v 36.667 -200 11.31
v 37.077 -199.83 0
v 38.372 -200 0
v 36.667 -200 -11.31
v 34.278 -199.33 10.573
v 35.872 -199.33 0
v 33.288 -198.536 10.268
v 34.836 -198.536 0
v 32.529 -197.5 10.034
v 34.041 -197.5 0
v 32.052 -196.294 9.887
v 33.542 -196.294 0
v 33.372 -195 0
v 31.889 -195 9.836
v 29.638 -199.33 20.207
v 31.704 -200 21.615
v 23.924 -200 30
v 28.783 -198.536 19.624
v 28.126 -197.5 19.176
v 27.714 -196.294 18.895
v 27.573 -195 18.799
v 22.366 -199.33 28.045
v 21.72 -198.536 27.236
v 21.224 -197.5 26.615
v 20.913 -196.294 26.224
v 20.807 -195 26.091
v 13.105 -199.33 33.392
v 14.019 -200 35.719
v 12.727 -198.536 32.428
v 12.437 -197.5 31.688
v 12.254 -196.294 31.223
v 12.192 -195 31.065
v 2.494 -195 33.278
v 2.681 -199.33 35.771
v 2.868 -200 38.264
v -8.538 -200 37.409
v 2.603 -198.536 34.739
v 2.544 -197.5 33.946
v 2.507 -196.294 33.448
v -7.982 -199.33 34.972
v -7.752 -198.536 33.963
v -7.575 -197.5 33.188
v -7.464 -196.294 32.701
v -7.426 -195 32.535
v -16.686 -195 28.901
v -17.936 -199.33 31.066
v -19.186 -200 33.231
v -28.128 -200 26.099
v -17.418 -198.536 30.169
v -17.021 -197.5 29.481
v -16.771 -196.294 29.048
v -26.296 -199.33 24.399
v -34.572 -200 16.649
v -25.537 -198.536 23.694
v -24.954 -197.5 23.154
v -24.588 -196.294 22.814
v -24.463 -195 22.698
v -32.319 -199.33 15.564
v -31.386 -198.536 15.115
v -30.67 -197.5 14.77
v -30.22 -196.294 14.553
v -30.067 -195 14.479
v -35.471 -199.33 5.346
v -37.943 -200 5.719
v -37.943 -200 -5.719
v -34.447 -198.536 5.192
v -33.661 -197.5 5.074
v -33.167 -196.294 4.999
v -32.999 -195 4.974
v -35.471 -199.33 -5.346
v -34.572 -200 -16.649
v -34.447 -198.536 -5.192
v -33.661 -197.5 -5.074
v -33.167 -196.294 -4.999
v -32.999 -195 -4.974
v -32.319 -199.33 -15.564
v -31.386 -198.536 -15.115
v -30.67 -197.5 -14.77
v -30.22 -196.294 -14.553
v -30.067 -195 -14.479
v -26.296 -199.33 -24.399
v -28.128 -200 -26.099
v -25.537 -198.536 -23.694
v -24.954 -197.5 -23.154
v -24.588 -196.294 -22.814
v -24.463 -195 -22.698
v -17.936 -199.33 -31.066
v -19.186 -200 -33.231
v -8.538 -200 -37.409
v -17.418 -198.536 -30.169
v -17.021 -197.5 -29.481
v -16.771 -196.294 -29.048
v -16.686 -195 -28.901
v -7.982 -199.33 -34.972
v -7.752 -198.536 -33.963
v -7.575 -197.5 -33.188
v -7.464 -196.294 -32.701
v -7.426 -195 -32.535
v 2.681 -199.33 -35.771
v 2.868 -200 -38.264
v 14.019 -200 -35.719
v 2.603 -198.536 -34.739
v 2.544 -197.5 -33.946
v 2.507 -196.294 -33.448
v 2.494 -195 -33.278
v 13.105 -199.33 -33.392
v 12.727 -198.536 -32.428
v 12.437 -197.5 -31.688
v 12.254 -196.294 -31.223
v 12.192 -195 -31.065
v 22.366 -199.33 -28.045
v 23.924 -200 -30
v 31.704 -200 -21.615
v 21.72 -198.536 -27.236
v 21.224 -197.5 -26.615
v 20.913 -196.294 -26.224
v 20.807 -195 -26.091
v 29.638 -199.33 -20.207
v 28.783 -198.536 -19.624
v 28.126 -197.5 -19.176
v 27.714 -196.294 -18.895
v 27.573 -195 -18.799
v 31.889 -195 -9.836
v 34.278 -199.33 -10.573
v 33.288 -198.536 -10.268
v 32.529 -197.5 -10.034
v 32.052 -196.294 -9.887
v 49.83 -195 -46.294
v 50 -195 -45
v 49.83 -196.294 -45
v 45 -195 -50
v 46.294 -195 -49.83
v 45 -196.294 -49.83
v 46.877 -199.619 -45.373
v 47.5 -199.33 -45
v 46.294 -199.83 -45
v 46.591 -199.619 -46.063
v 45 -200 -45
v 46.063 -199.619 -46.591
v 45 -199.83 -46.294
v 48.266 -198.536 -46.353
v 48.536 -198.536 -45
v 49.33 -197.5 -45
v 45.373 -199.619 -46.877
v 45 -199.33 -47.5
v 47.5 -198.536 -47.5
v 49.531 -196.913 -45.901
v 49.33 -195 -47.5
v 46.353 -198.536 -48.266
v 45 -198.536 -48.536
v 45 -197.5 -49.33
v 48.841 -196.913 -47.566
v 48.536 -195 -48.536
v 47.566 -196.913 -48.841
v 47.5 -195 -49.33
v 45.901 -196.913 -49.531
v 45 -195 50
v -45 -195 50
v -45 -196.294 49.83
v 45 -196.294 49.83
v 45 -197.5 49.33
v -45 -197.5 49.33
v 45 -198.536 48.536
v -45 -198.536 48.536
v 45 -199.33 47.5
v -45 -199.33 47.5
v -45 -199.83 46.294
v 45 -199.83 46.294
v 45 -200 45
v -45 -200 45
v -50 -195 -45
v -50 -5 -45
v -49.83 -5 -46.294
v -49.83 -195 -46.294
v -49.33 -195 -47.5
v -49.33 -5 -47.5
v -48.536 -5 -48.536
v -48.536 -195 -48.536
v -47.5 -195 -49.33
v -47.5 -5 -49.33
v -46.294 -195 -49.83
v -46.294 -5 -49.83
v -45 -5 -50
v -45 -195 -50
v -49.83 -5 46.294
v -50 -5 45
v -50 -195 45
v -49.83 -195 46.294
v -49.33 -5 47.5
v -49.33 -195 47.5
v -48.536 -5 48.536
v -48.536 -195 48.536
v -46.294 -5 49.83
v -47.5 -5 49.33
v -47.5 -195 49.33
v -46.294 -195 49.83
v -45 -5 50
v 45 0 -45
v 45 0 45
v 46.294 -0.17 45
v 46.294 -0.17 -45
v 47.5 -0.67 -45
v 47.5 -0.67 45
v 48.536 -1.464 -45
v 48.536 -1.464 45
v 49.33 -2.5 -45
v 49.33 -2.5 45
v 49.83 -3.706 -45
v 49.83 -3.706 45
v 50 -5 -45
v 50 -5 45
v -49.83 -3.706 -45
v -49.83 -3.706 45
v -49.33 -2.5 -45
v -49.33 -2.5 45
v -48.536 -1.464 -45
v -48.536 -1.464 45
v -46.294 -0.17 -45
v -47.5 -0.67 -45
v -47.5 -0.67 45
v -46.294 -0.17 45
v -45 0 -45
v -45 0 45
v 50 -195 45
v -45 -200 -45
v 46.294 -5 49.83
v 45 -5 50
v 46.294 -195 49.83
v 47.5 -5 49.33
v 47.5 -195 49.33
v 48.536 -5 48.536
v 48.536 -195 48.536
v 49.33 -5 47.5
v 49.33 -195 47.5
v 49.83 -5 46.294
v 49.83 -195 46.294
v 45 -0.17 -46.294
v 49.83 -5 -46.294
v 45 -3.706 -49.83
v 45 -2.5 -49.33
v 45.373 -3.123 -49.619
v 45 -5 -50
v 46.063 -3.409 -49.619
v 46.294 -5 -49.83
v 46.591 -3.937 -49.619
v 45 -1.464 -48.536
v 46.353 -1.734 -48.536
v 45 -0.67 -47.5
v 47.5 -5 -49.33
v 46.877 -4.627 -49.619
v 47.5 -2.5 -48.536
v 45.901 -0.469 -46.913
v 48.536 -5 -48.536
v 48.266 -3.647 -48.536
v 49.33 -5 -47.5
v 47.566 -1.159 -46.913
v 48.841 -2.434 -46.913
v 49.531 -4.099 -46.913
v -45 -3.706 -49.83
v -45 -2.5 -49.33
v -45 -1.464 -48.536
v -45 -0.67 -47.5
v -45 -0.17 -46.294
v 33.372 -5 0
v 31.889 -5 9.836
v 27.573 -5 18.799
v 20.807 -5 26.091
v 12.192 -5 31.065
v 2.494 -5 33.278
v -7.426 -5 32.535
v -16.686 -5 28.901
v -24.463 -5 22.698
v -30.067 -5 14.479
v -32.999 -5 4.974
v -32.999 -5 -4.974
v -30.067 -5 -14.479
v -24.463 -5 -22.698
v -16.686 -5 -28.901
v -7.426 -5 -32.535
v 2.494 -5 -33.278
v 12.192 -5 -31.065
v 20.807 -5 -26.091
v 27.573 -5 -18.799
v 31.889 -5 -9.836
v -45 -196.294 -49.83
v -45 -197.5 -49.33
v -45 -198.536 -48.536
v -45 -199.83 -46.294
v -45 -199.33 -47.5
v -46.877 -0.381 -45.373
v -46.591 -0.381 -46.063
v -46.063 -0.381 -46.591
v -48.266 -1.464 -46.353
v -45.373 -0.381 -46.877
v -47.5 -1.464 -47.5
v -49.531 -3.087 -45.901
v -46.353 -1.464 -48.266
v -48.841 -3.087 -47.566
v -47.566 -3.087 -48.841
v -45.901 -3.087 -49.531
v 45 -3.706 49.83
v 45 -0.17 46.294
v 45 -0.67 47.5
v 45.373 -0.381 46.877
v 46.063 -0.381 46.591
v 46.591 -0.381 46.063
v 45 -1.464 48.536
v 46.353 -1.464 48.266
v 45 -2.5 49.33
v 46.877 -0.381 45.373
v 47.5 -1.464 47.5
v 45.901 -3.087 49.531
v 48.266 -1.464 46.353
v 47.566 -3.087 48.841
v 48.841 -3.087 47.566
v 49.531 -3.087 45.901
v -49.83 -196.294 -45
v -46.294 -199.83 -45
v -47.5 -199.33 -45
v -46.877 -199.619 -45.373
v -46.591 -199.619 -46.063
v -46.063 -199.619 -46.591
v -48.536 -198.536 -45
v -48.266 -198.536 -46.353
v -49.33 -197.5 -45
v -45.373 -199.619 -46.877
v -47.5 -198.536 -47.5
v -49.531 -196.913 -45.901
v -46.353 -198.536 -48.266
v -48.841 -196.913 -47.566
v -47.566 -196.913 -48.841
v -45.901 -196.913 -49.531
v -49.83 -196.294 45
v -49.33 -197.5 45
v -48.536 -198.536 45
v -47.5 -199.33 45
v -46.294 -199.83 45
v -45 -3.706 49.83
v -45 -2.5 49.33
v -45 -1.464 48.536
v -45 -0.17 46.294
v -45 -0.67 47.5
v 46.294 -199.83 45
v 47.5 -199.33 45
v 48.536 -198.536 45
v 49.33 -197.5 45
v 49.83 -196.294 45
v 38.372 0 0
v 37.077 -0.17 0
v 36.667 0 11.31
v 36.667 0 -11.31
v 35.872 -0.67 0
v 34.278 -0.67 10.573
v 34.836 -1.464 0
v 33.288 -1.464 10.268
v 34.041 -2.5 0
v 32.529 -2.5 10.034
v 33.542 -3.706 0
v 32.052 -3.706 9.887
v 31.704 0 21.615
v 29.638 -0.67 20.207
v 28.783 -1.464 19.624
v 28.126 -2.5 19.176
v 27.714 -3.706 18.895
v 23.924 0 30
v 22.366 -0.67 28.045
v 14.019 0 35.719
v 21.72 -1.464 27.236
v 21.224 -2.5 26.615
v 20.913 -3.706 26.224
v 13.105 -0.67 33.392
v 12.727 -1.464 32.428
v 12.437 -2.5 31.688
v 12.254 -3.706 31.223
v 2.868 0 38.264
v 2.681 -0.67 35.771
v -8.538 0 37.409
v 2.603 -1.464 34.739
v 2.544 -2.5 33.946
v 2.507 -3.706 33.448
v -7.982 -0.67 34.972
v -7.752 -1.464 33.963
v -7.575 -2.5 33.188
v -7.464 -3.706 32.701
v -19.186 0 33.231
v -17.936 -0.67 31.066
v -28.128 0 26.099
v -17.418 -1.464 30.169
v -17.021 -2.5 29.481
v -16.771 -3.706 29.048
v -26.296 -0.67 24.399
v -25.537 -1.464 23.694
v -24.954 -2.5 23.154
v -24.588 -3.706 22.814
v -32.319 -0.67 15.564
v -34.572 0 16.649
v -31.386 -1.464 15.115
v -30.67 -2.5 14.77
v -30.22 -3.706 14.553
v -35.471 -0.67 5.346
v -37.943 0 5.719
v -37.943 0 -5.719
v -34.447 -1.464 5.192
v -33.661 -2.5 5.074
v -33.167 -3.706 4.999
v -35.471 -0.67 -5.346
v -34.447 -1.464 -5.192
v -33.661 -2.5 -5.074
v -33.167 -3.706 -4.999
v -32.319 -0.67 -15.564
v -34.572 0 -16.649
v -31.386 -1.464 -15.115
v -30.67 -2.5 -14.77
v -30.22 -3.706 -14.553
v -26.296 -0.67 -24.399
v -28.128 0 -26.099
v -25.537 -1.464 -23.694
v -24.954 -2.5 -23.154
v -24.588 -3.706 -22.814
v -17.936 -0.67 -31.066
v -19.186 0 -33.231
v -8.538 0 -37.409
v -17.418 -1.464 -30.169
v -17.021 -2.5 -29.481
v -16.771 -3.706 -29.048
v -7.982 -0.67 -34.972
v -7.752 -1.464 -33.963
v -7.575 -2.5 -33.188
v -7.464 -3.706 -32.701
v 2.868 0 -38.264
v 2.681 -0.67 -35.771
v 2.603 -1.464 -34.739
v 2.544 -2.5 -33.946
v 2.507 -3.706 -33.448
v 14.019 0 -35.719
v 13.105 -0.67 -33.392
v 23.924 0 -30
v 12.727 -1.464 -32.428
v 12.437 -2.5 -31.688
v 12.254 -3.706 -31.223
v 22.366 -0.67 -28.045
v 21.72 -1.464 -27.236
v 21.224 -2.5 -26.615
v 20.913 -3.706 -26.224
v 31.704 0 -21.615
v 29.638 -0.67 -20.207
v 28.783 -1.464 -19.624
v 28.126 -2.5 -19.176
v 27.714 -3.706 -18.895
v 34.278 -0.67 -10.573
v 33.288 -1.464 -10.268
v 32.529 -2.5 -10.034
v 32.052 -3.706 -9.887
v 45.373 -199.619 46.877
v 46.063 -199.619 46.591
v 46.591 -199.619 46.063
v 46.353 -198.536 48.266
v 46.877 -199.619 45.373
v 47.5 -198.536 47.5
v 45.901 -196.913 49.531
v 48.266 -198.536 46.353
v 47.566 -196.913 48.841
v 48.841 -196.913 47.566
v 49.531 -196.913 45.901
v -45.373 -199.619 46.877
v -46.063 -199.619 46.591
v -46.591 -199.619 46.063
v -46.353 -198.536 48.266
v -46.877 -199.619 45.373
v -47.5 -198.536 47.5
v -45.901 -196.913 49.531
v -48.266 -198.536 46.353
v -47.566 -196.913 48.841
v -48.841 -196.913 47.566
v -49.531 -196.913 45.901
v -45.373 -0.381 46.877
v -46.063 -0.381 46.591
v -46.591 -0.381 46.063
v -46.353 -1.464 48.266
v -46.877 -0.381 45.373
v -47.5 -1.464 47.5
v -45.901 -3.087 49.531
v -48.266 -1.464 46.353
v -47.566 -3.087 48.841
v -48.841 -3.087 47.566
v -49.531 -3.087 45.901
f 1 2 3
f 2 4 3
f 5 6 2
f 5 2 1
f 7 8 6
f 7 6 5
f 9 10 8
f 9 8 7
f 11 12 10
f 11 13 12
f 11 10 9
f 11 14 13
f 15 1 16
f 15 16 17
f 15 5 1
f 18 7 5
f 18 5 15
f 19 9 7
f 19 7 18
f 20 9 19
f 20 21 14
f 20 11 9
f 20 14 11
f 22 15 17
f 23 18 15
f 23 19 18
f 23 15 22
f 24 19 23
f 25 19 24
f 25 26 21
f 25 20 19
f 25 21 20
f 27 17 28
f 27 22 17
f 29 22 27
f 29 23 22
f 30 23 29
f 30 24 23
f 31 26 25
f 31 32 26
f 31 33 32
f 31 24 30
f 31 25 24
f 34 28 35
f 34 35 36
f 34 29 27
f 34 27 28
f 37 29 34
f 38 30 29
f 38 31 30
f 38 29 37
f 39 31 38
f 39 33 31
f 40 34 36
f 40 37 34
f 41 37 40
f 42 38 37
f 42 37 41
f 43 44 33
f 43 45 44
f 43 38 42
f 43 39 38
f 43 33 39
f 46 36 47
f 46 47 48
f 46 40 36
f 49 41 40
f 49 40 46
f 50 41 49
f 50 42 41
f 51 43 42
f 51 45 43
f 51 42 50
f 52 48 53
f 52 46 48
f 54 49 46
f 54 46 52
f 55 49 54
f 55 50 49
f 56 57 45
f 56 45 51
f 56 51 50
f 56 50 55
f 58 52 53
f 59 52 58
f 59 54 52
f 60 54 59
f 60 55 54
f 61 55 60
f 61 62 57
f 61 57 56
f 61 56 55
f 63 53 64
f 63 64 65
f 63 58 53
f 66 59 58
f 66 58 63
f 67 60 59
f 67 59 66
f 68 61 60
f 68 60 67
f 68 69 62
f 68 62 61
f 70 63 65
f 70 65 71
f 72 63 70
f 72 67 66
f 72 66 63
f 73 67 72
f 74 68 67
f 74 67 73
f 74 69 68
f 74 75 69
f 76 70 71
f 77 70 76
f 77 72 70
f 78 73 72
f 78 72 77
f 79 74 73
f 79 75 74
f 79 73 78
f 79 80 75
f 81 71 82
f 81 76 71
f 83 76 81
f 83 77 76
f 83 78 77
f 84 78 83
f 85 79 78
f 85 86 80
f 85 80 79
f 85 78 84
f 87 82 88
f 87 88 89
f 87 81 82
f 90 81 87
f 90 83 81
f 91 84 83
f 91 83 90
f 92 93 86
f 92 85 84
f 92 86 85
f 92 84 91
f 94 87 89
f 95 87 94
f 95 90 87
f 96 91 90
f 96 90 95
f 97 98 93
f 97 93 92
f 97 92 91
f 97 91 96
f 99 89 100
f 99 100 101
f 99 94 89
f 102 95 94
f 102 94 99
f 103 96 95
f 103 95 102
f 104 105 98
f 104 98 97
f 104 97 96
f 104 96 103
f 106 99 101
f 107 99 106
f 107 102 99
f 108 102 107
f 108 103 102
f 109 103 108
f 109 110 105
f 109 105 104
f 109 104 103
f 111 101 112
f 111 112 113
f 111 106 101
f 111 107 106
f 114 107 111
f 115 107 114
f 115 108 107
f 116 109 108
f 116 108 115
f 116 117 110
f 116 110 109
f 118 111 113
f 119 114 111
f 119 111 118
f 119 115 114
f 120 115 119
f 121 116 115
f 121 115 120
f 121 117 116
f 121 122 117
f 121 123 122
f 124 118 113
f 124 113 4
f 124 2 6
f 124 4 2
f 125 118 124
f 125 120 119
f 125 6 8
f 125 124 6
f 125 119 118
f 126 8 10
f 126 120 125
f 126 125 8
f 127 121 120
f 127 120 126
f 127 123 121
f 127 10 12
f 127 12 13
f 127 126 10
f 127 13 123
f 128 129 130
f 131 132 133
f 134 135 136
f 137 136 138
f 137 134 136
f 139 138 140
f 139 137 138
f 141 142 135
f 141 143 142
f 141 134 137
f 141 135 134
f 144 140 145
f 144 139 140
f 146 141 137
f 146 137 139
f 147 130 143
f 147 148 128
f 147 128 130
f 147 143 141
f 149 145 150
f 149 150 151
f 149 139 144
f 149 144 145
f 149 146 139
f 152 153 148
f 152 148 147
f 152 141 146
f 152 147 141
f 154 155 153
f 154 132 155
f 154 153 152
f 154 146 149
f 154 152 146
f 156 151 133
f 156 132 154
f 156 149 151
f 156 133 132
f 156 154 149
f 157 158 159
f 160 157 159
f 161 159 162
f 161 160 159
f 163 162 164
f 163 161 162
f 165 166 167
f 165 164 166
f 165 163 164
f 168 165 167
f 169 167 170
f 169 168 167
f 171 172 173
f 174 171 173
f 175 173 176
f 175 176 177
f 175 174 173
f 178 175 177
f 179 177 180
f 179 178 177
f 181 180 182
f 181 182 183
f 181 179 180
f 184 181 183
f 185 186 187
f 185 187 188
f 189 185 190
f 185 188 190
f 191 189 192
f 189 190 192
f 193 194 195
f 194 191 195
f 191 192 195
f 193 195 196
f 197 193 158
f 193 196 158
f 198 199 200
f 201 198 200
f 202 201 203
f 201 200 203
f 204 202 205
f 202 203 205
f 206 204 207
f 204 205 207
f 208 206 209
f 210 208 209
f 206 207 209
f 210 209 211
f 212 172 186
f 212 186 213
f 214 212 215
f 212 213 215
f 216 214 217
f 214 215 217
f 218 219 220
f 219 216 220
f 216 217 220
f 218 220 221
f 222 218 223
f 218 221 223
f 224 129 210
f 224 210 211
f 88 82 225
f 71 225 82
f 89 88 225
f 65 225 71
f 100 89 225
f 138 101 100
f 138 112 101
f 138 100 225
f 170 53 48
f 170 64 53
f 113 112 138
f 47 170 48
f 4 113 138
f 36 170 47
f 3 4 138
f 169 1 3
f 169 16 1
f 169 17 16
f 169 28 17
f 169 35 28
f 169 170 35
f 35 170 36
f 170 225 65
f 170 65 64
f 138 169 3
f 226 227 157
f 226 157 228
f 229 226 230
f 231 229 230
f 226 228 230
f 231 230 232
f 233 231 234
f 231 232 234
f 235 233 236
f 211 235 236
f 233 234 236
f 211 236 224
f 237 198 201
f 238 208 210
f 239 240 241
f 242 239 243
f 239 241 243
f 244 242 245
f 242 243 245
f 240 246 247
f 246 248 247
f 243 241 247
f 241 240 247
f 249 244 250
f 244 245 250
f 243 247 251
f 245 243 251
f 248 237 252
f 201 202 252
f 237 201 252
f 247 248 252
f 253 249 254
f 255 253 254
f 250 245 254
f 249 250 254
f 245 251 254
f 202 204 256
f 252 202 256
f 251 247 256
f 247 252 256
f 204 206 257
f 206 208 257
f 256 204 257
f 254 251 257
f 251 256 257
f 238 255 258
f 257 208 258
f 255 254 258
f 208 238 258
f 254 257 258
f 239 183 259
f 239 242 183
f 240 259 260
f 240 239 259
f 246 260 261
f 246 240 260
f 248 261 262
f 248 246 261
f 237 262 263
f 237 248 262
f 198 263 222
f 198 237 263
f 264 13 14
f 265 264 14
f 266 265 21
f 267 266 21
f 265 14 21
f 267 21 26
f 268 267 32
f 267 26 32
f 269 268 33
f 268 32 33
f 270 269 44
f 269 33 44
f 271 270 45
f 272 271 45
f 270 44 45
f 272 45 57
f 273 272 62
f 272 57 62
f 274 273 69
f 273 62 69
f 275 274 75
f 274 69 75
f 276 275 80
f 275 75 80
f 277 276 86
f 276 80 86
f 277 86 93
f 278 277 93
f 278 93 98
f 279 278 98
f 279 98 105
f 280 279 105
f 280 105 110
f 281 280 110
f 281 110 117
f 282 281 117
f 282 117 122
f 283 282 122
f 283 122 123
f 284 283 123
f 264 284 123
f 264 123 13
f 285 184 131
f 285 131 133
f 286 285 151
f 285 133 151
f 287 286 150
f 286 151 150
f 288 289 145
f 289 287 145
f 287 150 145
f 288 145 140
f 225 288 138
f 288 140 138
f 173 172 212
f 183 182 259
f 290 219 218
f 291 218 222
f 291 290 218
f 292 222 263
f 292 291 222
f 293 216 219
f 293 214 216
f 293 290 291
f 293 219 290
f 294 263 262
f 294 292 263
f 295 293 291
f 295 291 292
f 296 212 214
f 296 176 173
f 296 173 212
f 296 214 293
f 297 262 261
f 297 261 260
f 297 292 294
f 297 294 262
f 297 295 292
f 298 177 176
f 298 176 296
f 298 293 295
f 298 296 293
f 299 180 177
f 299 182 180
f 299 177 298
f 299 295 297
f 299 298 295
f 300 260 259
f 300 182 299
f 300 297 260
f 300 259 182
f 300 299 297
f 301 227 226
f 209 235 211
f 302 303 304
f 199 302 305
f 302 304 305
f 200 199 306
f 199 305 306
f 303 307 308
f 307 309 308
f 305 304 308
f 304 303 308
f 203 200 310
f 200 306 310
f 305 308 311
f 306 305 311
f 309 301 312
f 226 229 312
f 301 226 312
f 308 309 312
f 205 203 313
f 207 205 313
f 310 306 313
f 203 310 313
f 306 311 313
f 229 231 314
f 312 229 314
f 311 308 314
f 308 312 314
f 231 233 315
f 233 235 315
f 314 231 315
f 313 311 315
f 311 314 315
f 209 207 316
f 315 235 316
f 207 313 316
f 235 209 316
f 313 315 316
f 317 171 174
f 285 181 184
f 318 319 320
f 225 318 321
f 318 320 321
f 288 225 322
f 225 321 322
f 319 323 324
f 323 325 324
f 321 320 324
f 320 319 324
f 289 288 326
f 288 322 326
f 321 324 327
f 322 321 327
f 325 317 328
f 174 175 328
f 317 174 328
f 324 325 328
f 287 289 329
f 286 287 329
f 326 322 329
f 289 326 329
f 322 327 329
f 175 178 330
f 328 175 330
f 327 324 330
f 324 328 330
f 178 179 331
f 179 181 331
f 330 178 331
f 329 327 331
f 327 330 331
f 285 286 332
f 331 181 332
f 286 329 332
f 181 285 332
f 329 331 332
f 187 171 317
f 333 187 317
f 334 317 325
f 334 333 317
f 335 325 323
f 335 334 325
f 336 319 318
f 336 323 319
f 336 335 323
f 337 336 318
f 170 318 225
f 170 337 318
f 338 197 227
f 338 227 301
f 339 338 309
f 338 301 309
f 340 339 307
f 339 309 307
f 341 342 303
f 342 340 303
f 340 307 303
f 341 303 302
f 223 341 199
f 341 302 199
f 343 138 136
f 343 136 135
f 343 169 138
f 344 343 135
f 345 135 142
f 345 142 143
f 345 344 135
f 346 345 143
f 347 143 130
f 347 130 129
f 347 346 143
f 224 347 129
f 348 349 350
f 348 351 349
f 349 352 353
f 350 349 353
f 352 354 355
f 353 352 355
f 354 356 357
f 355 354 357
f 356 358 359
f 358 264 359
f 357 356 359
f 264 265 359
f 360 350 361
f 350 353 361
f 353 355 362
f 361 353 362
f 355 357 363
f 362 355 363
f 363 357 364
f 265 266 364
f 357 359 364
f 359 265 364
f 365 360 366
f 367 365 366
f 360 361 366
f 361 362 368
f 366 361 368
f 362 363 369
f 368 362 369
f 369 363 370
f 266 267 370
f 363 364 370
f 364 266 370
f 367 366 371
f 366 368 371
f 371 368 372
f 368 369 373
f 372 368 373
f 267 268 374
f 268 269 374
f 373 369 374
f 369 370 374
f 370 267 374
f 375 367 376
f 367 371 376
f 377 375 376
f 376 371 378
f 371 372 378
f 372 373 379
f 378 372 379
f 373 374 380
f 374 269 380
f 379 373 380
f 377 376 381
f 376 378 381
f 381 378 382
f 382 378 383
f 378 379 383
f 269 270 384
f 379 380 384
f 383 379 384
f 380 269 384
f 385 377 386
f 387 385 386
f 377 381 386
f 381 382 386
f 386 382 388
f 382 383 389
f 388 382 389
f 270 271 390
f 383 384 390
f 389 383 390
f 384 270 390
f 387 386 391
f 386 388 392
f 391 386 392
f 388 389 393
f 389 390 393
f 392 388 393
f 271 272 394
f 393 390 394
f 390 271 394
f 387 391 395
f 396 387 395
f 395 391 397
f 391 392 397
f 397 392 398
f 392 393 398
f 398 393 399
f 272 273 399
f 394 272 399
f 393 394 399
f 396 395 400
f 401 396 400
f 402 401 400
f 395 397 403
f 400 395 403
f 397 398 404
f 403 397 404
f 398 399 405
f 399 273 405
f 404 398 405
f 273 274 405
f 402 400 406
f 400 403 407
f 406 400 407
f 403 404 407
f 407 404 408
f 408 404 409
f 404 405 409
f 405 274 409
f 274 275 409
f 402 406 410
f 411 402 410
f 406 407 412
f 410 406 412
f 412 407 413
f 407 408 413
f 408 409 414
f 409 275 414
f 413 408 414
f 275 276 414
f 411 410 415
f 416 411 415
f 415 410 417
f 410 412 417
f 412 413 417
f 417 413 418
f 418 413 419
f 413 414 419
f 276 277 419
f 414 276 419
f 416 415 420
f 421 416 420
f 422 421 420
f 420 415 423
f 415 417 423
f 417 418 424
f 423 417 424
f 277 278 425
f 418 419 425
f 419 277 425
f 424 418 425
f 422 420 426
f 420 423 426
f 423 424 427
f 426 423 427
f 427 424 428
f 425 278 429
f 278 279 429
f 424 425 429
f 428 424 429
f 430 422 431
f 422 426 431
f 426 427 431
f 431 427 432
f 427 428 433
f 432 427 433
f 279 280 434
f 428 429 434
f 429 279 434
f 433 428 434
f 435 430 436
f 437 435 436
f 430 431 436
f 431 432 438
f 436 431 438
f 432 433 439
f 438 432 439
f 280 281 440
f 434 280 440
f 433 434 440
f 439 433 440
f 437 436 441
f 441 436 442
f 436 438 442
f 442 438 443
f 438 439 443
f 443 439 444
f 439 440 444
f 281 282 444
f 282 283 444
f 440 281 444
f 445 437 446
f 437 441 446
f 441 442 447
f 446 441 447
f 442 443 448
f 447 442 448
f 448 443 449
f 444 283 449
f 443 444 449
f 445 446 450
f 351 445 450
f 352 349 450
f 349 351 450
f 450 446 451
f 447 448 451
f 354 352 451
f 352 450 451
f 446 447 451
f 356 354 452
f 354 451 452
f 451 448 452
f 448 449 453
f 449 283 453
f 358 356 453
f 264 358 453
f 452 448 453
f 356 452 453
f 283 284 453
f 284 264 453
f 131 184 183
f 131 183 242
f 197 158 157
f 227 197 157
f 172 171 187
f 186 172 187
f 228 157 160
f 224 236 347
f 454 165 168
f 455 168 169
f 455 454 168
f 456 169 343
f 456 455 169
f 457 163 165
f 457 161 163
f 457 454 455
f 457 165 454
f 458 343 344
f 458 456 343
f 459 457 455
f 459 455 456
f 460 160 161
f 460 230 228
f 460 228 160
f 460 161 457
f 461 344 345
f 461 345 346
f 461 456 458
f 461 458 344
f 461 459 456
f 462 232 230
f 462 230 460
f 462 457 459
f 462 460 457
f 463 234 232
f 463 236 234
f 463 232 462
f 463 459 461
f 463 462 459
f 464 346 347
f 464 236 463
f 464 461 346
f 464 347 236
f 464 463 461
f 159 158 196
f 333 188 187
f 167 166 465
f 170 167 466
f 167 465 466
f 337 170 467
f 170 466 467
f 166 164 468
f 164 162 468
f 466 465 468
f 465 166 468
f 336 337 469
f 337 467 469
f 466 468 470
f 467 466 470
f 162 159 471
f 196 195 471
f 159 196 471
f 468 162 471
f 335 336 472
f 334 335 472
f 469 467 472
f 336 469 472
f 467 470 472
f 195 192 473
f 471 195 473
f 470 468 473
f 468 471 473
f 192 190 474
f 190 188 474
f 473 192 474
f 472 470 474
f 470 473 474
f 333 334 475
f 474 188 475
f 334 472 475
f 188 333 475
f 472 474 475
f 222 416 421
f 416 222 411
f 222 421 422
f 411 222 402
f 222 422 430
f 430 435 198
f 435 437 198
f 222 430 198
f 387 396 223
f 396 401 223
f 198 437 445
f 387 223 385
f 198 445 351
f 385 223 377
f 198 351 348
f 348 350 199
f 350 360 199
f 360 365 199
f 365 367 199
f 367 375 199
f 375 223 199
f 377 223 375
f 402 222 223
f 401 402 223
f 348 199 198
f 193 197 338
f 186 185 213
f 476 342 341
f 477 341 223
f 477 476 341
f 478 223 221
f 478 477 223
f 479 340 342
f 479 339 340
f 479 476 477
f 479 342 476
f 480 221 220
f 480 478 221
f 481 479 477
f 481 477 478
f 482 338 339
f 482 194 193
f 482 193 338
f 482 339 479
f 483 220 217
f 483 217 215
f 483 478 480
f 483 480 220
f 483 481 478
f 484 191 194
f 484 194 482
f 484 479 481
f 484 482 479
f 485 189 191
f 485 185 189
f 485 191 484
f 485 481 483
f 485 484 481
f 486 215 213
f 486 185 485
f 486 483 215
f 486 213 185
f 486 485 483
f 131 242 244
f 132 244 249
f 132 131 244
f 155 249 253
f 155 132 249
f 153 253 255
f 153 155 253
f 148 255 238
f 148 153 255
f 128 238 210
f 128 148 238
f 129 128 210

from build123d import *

# Parameters (mm, degrees)
F0_W     = 100
F0_H     = 100
F1_DEPTH = 200
F2_R     = 33.3715216042
F3_DEPTH = 273
F4_R     = 5


with BuildPart() as f1:
    # F0 (on Front) → F1 (new body)
    with BuildSketch(Plane.XZ):
        Rectangle(F0_W, F0_H)
    extrude(amount=F1_DEPTH)

    # F2 (on face) → F3 (cut)
    with BuildSketch(Plane.XZ.offset(200)):
        Circle(F2_R)
    extrude(amount=-F3_DEPTH, mode=Mode.SUBTRACT)

    # F4
    f4_edges = [f1.edges().sort_by_distance(p)[0] for p in [
        (50, -100, 50),
        (-50, -100, 50),
        (0, 0, 50),
        (0, -200, 50),
        (-50, -100, -50),
        (-50, 0, 0),
        (-50, -200, 0),
        (50, 0, 0),
        (0, 0, -50),
        (-33.371522, 0, 0),
        (50, -100, -50),
        (50, -200, 0),
        (0, -200, -50),
        (-33.371522, -200, 0),
    ]]
    fillet(f4_edges, radius=F4_R)


solid = f1.part
